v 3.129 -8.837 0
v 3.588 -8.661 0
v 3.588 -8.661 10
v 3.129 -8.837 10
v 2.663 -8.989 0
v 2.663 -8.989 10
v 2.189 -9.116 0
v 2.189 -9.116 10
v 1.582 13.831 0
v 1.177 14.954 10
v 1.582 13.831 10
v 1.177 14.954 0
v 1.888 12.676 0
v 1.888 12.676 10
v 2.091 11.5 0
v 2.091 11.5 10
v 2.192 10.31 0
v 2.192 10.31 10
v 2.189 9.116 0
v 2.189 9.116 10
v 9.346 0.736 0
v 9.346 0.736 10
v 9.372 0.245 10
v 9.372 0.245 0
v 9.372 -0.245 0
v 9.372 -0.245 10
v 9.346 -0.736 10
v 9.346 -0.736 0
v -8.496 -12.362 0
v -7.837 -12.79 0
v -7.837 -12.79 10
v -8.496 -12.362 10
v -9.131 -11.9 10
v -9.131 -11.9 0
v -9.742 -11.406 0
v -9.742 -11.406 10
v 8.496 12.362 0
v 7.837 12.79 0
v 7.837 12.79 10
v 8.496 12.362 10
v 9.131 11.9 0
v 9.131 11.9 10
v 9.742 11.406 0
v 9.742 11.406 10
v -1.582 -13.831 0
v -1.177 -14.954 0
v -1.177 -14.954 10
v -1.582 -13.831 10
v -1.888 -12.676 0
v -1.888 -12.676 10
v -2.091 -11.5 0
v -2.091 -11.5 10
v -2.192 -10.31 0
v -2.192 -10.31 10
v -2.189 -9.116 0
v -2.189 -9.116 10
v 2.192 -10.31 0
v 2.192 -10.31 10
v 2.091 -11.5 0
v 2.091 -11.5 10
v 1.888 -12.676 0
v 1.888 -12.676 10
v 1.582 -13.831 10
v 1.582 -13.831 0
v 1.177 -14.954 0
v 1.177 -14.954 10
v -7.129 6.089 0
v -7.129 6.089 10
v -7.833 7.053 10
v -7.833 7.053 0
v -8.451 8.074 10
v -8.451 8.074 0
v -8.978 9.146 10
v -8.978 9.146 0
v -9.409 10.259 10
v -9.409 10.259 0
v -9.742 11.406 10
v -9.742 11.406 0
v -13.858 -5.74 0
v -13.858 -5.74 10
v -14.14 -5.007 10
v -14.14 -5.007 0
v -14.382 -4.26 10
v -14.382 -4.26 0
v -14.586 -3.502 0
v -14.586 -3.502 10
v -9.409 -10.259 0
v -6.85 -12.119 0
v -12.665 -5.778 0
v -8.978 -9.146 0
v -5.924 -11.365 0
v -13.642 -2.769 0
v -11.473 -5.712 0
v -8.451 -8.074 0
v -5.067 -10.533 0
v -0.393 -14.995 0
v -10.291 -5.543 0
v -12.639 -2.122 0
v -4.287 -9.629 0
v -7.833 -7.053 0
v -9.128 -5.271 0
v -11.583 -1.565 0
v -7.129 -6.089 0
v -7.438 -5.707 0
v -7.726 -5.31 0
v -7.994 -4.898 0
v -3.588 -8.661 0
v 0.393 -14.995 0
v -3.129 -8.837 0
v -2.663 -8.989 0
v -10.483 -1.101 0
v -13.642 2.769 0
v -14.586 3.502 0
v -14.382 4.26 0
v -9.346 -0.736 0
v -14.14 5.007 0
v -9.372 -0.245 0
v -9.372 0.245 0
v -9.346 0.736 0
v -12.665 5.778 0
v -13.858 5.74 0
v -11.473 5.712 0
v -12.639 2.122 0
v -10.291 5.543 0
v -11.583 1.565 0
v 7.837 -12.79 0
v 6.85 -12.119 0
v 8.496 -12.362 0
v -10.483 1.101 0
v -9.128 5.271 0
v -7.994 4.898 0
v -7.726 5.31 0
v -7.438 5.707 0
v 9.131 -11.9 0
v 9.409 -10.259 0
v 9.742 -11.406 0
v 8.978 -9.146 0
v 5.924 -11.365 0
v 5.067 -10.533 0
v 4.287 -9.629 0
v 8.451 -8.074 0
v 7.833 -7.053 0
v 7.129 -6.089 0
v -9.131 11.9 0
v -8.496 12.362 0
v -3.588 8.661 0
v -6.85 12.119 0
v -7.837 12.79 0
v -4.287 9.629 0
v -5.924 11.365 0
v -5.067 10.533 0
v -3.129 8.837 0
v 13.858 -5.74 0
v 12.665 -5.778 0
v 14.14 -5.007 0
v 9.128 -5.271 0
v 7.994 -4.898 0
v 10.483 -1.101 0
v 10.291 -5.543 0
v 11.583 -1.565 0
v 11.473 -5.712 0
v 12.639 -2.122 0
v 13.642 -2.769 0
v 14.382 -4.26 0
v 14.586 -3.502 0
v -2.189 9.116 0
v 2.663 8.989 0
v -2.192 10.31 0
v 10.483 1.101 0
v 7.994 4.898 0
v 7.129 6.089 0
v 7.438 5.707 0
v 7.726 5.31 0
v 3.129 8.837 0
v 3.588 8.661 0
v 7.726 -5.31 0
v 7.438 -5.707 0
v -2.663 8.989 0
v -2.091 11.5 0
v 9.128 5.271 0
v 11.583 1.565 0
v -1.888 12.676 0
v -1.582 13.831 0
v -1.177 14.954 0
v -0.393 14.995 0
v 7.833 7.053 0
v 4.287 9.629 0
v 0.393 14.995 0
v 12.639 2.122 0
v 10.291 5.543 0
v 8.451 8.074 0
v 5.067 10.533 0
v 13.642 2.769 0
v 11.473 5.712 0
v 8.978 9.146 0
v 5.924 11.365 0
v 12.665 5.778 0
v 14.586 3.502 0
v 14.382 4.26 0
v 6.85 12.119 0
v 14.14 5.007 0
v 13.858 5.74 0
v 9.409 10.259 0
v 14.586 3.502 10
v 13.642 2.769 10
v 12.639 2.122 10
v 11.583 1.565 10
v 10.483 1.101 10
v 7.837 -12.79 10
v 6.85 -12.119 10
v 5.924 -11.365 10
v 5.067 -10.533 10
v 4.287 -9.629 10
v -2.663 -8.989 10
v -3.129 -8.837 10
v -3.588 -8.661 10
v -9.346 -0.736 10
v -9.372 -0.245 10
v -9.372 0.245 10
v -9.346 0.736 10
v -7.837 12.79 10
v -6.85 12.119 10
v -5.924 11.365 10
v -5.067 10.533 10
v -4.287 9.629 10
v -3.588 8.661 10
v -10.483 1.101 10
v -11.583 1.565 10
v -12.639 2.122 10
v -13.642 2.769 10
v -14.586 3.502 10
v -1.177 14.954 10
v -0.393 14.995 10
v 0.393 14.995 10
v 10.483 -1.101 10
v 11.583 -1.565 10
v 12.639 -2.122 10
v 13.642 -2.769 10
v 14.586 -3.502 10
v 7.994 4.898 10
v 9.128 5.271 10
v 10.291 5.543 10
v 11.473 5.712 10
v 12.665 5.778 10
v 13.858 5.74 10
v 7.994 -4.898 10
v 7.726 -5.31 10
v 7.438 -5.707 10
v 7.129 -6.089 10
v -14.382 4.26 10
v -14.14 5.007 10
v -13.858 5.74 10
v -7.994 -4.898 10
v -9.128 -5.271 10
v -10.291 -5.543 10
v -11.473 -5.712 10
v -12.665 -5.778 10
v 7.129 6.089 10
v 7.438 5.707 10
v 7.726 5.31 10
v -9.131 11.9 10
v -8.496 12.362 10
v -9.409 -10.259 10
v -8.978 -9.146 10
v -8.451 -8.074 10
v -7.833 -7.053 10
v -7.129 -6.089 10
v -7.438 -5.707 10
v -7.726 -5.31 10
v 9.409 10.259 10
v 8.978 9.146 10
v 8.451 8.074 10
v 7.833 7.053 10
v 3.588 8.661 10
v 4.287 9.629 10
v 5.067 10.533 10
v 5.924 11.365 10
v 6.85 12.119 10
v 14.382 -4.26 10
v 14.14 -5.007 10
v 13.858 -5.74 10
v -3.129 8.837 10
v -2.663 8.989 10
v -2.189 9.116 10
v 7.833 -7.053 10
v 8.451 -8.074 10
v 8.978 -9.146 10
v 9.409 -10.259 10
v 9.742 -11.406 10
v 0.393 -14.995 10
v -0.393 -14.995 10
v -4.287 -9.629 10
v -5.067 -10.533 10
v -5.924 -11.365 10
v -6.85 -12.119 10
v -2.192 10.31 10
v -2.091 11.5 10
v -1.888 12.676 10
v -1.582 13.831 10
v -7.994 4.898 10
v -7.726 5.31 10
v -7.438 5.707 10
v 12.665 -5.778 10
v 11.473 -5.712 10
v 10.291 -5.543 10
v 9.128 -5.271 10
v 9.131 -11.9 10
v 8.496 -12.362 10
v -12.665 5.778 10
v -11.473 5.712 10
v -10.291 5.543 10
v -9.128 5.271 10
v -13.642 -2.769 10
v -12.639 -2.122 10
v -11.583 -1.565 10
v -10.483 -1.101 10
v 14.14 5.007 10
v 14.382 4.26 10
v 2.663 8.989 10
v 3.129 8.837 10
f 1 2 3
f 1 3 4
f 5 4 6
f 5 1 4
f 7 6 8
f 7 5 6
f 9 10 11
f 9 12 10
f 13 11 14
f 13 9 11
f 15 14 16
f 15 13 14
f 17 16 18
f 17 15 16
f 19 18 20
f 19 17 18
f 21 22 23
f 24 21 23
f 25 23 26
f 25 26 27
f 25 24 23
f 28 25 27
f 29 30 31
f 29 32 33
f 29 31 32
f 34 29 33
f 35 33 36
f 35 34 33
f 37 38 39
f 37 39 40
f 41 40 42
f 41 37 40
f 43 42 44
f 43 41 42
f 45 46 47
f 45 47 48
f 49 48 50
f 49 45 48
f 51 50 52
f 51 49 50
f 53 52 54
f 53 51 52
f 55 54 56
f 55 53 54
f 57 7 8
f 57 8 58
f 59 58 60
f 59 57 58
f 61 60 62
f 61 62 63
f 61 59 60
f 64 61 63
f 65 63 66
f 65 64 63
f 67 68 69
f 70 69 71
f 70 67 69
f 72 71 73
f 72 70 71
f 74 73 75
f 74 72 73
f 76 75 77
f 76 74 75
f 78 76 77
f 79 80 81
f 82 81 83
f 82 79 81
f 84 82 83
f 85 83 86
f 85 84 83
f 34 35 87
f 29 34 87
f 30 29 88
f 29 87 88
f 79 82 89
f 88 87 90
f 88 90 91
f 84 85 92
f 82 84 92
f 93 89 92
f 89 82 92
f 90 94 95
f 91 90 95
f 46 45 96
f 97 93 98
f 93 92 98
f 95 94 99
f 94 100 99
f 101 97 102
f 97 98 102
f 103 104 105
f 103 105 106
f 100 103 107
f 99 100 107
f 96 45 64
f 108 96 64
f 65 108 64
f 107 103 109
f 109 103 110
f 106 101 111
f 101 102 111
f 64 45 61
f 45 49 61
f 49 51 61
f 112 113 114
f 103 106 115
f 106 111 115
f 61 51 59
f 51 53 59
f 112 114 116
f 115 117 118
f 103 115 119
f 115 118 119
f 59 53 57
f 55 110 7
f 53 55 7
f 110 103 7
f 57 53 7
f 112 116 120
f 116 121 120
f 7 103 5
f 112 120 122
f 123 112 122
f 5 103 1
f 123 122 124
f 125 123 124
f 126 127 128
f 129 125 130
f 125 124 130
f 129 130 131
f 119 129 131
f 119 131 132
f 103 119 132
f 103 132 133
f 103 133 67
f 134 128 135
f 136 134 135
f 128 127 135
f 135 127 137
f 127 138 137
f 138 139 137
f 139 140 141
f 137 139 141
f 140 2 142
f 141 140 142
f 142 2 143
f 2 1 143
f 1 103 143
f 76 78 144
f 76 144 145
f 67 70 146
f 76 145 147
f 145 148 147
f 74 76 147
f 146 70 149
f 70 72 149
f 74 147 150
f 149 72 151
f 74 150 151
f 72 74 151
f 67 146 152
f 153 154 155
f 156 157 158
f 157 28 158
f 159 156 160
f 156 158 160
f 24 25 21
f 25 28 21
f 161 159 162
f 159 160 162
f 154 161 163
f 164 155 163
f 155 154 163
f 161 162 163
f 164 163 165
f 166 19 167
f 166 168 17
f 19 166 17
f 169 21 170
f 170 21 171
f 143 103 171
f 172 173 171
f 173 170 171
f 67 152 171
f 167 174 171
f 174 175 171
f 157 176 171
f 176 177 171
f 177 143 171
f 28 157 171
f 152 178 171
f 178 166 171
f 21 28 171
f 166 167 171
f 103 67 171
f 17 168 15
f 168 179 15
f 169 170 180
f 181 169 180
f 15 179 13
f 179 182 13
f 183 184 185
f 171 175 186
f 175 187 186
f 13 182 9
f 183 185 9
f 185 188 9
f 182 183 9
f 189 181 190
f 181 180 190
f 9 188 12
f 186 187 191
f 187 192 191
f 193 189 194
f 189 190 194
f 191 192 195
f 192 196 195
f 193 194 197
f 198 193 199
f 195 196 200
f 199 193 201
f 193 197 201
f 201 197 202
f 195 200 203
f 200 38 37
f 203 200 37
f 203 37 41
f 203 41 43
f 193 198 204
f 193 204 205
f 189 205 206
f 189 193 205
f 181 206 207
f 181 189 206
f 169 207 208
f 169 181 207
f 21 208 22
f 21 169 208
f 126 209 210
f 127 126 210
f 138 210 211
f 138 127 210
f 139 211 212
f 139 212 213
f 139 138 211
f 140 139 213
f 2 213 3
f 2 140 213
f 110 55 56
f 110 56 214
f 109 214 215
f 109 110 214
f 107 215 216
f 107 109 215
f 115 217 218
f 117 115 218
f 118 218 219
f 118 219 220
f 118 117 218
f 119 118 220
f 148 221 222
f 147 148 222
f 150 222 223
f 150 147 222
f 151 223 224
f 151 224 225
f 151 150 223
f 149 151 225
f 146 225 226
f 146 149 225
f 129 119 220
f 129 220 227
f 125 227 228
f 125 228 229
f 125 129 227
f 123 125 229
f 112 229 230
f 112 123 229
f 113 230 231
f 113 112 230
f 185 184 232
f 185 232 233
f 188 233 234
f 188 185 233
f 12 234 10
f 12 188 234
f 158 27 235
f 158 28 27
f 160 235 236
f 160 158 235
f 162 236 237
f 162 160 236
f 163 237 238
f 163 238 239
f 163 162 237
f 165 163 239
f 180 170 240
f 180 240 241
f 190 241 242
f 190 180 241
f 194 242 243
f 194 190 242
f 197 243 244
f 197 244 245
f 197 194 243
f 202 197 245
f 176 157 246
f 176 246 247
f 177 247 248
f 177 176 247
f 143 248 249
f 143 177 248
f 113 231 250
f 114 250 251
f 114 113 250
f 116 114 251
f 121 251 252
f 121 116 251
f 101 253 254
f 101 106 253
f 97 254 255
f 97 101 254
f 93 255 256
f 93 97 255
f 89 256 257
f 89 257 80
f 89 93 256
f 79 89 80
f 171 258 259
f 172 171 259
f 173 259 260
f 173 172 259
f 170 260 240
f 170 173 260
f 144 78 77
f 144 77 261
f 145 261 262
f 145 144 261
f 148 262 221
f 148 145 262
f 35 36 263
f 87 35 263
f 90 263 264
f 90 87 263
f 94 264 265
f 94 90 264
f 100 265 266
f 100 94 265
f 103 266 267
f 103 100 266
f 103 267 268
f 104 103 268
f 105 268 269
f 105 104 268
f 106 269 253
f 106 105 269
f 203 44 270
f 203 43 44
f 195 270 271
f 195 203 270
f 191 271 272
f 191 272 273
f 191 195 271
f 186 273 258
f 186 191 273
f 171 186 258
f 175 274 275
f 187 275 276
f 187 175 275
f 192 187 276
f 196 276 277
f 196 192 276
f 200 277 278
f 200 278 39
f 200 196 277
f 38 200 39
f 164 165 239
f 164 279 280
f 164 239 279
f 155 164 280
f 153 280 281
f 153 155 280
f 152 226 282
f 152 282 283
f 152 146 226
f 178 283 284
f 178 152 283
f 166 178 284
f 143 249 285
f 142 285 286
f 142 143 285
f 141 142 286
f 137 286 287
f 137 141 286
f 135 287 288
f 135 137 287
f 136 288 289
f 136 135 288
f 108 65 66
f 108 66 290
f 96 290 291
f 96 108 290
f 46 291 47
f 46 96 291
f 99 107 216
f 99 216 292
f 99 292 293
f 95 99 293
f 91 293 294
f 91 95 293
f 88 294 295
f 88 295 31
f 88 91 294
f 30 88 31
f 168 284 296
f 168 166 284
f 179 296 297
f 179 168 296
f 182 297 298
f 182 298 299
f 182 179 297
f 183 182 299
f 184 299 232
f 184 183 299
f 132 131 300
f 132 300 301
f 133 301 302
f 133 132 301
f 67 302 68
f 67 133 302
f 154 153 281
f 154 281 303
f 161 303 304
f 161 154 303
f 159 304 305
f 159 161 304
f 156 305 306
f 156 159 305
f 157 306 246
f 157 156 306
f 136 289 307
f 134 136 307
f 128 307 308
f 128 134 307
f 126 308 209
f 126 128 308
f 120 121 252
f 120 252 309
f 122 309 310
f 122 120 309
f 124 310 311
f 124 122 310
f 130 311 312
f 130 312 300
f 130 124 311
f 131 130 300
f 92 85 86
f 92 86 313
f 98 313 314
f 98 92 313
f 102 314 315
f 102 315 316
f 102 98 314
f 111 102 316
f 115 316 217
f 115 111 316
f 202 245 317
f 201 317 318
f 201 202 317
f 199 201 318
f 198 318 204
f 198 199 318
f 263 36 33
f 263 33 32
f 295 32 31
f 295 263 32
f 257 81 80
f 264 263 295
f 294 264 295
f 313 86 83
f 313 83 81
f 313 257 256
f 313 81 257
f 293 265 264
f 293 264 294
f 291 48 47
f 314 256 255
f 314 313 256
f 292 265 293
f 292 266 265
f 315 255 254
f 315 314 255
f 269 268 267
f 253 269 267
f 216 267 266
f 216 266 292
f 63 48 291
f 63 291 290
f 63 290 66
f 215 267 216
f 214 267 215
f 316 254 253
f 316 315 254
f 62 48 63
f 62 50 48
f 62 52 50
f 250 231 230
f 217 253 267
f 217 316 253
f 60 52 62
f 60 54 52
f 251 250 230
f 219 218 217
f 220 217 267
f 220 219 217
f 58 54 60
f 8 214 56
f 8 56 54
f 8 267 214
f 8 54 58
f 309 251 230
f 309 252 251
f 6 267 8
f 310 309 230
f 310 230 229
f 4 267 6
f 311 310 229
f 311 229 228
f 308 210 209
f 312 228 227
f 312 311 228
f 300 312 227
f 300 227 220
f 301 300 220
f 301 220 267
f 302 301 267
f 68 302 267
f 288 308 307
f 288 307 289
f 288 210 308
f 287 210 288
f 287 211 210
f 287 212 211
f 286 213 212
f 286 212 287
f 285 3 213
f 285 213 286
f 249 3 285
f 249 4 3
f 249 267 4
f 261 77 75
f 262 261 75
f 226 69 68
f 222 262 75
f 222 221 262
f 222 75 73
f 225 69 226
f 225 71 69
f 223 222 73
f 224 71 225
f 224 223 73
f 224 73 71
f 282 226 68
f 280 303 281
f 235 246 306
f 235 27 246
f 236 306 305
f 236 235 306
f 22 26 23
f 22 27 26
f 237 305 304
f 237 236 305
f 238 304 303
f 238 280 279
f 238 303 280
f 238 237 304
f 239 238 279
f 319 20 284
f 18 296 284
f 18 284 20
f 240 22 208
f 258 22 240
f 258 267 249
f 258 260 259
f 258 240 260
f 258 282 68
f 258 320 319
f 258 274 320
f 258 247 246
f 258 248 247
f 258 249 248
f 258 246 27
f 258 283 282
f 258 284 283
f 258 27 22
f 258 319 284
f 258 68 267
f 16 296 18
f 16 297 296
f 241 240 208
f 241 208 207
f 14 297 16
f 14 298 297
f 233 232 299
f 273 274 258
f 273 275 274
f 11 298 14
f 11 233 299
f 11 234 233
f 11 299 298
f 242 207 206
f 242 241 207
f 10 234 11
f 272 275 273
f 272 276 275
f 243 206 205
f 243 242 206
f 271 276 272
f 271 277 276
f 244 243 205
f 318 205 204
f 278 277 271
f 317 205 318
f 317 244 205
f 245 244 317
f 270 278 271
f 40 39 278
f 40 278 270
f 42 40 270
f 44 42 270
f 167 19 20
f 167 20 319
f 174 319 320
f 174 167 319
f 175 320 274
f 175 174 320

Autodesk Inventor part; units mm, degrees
sketch "Sketch1" plane through (0, 0, 0) normal (0, 0, 1) x (1, 0, 0)
  circle A0 centre (0, 0) radius 15
  dimension "d0" = 30
extrude "Extrusion1" add sketch "Sketch1" along normal blind 10
ref_plane "Work Plane2" through (0, 0, 5) normal (0, 0, 1) x (1, 0, 0)
sketch "Sketch2" plane through (0, 0, 0) normal (0, 0, -1) x (-1, 0, 0)
  circle A0 centre (0, 0) radius 15 projected
  circle A1 centre (0, 0) radius 12.5
  dimension "d3" = 25
surface extrude "Pitch Diameter" sketch "Sketch2" against normal through all shown no curves A1
ref_plane "Work Plane8" through (0, 0, 0) normal (0.9510565, 0.309017, 0) x (0, 0, 1)
ref_plane "Work Plane9" through (0, 0, 0) normal (1, 0, 0) x (0, 1, 0)
spur gear teeth "Spur Gear" teeth 10 pitch diameter 25 tip diameter 30 root diameter 18.75 face width 10 start plane through (0, 0, 0) normal (0, 0, -1) x (-1, 0, 0)
equation "\"d0\" = da_da"
equation "\"d1\" = da_b"
equation "\"d3\" = da_d"
equation "\"da_da\" = 30"
equation "\"da_b\" = 10"
equation "\"da_d\" = 25"
properties part number "Spur Gear1" material "Steel"
